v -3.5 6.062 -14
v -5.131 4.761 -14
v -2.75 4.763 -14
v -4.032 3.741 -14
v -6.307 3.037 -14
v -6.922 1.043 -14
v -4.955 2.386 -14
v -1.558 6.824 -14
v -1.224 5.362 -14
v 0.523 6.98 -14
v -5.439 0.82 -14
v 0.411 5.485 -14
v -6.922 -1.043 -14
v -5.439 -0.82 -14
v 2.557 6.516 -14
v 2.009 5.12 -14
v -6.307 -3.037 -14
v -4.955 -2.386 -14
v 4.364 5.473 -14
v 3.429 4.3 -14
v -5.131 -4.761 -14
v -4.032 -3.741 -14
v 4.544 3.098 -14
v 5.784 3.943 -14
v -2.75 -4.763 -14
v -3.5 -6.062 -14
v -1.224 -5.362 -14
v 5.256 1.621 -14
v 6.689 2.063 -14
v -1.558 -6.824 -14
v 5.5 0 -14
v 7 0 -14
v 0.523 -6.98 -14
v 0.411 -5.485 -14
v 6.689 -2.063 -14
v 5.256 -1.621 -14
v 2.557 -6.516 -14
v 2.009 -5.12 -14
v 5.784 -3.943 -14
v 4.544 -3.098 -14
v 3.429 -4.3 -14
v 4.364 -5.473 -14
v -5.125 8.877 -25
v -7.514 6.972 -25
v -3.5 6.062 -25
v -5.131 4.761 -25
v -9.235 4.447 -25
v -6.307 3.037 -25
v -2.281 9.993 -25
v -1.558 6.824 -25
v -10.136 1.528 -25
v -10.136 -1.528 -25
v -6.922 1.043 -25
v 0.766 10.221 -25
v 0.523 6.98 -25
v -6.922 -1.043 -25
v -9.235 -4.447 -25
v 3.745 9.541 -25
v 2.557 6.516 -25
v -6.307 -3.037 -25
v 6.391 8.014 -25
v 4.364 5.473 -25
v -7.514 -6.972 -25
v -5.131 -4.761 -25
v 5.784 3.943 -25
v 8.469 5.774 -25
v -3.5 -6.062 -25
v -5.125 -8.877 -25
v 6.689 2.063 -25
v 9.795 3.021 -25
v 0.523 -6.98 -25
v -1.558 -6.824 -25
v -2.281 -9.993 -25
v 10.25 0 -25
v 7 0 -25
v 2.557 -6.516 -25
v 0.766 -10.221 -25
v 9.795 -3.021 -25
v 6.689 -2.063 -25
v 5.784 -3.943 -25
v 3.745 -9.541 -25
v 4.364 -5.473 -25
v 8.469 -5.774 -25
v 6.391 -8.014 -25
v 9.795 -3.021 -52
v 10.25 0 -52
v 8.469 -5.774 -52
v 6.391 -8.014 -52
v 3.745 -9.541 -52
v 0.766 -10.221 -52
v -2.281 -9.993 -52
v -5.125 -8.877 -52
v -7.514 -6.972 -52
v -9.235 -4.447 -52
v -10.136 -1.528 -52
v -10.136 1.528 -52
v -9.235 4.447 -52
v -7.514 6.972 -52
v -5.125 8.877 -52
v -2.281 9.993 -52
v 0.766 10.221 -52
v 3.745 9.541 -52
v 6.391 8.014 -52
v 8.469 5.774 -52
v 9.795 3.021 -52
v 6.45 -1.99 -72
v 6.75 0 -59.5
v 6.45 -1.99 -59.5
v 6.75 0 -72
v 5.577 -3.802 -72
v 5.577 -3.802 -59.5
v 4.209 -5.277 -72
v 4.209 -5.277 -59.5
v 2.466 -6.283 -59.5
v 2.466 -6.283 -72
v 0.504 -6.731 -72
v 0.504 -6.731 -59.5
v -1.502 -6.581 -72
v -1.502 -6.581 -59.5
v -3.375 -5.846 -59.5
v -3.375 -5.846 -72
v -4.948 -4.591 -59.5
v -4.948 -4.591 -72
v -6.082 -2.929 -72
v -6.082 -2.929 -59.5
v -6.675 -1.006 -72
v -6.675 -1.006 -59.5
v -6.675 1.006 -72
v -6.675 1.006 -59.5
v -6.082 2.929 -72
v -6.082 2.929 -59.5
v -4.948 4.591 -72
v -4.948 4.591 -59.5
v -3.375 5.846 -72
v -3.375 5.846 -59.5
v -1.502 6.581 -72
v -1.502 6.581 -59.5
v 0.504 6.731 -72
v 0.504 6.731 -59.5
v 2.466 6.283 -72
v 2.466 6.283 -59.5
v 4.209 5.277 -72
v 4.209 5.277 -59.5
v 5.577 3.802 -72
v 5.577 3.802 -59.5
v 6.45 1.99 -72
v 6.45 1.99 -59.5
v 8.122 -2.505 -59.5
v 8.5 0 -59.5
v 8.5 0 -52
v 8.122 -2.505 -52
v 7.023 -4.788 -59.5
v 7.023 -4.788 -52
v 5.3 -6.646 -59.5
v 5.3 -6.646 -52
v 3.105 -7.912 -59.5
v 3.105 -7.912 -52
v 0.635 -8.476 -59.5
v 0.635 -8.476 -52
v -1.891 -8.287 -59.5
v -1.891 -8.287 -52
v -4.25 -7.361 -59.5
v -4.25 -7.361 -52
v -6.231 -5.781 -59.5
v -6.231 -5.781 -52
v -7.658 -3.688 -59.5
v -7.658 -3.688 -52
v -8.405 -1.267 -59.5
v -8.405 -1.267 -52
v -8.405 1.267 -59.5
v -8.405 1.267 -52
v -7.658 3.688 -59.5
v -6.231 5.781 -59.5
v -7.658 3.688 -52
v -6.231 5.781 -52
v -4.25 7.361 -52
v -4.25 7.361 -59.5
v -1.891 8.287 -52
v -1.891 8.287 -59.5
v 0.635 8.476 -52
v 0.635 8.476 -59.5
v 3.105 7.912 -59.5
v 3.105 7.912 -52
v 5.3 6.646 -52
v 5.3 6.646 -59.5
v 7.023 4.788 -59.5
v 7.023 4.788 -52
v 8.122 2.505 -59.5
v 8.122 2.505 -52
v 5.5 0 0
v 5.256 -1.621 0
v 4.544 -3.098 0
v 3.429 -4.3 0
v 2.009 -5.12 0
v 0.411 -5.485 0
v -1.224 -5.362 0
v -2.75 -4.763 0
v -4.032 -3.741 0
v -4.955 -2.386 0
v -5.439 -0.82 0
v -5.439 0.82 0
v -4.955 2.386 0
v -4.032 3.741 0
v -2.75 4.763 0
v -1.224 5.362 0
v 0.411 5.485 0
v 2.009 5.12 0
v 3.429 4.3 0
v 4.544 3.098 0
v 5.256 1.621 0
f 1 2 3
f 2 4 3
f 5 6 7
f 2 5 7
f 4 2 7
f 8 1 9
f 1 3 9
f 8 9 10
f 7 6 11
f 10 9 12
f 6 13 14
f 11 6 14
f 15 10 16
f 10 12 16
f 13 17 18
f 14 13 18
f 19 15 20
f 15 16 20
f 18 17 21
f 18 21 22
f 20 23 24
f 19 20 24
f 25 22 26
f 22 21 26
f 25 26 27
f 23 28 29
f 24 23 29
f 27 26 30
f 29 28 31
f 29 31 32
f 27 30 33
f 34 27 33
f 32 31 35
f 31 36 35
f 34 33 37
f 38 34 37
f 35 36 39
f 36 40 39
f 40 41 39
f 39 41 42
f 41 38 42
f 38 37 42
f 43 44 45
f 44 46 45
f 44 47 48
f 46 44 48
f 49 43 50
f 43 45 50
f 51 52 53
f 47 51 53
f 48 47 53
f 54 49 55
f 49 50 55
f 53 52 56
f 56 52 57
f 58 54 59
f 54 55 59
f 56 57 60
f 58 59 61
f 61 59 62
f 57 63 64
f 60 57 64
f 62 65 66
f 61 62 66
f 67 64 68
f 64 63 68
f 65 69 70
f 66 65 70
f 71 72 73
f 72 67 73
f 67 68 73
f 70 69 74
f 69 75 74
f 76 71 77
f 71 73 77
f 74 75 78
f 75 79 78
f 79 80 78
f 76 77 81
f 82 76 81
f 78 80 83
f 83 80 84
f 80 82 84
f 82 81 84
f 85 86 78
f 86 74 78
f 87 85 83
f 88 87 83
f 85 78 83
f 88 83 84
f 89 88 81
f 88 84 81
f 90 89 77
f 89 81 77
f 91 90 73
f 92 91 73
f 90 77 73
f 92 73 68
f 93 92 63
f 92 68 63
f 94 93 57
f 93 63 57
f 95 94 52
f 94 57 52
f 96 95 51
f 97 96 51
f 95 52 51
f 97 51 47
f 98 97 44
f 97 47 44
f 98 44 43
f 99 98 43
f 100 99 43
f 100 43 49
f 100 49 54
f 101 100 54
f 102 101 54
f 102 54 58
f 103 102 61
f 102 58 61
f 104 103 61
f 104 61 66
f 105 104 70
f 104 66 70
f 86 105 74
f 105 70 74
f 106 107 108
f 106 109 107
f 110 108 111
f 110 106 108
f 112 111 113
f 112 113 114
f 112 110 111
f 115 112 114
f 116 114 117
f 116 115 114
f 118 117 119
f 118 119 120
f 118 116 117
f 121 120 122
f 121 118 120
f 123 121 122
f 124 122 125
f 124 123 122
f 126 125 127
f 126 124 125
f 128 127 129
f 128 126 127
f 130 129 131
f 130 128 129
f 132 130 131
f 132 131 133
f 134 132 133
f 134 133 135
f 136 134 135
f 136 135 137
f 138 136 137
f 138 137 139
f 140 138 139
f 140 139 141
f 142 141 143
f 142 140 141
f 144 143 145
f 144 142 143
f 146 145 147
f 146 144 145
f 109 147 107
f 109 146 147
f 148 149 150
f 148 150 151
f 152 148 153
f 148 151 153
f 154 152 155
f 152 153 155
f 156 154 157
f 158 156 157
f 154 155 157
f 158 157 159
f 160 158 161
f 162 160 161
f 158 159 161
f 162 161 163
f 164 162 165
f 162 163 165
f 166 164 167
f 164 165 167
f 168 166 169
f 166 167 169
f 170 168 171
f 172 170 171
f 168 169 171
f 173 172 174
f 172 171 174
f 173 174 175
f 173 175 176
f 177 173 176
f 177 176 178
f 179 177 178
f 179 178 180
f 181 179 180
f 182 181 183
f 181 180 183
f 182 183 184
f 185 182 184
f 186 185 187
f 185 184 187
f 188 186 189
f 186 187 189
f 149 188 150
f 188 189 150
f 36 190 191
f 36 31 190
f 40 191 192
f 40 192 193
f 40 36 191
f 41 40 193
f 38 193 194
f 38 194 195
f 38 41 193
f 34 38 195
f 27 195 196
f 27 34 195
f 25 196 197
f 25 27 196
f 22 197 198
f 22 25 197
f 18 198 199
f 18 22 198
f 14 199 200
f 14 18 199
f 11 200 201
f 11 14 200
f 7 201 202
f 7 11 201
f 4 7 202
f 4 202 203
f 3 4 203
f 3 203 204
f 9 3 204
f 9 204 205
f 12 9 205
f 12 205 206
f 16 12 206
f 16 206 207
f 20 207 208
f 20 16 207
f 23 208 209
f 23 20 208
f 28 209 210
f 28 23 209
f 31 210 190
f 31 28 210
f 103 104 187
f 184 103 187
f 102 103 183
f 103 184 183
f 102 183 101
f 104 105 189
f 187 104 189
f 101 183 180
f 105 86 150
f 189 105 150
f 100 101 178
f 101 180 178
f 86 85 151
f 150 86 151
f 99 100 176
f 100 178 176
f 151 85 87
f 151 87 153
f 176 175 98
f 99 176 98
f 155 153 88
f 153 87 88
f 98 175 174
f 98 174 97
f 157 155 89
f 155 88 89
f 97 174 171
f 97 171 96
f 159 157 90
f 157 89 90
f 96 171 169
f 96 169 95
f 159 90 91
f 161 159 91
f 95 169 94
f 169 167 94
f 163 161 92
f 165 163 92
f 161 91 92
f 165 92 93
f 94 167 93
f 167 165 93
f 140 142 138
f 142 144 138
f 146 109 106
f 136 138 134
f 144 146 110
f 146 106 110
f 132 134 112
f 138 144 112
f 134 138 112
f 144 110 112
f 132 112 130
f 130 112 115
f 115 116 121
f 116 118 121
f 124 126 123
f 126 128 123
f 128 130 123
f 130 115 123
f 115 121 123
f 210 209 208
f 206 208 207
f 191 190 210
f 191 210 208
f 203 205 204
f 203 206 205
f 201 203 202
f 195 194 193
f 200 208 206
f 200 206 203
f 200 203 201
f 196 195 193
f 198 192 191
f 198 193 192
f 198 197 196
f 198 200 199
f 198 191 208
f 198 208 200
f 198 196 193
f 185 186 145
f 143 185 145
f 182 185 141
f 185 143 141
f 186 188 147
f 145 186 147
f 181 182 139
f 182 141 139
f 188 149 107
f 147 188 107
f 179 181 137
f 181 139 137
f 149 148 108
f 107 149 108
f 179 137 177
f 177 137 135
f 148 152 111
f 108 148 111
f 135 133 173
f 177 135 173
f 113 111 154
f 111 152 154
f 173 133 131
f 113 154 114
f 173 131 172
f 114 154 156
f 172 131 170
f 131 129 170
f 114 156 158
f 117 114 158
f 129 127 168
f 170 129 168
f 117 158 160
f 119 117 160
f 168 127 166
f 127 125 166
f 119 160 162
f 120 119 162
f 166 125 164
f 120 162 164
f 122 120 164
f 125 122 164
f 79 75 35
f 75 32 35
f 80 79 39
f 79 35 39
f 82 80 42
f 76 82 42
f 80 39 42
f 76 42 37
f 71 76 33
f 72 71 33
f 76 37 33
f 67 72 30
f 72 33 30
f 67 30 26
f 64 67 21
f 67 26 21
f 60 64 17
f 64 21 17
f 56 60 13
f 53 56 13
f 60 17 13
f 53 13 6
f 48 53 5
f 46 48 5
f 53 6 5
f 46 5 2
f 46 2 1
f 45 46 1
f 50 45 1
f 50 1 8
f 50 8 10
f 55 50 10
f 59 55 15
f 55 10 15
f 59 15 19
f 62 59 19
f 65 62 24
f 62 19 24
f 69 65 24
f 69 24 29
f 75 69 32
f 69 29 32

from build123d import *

# Parameters (mm, degrees)
SKETCH1_W   = 14
SKETCH1_H   = 5.5
SKETCH1_W_2 = 12.5
SKETCH1_H_2 = 6.75


with BuildPart() as part:
    # Sketch1 → Revolve2 (revolve)
    with BuildSketch(Plane(origin=(0, 0, 0), x_dir=(0, 0, -1), z_dir=(1, 0, 0)), mode=Mode.PRIVATE) as revolve2_sk:
        with Locations((7, 2.75)):
            Rectangle(SKETCH1_W, SKETCH1_H)
        Polygon((14, 5.5), (14, 0), (25, 0), (25, 7), (14, 7), align=None)
        Polygon((25, 7), (25, 0), (52, 0), (52, 8.5), (52, 10.25), (25, 10.25), align=None)
        Polygon((52, 8.5), (52, 0), (59.5, 0), (59.5, 6.75), (59.5, 8.5), align=None)
        with Locations((65.75, 3.375)):
            Rectangle(SKETCH1_W_2, SKETCH1_H_2)
    revolve(revolve2_sk.sketch.rotate(Axis((0, 0, -25), (0, 0, -1)), 90), axis=Axis((0, 0, -25), (0, 0, -1)))


solid = part.part
